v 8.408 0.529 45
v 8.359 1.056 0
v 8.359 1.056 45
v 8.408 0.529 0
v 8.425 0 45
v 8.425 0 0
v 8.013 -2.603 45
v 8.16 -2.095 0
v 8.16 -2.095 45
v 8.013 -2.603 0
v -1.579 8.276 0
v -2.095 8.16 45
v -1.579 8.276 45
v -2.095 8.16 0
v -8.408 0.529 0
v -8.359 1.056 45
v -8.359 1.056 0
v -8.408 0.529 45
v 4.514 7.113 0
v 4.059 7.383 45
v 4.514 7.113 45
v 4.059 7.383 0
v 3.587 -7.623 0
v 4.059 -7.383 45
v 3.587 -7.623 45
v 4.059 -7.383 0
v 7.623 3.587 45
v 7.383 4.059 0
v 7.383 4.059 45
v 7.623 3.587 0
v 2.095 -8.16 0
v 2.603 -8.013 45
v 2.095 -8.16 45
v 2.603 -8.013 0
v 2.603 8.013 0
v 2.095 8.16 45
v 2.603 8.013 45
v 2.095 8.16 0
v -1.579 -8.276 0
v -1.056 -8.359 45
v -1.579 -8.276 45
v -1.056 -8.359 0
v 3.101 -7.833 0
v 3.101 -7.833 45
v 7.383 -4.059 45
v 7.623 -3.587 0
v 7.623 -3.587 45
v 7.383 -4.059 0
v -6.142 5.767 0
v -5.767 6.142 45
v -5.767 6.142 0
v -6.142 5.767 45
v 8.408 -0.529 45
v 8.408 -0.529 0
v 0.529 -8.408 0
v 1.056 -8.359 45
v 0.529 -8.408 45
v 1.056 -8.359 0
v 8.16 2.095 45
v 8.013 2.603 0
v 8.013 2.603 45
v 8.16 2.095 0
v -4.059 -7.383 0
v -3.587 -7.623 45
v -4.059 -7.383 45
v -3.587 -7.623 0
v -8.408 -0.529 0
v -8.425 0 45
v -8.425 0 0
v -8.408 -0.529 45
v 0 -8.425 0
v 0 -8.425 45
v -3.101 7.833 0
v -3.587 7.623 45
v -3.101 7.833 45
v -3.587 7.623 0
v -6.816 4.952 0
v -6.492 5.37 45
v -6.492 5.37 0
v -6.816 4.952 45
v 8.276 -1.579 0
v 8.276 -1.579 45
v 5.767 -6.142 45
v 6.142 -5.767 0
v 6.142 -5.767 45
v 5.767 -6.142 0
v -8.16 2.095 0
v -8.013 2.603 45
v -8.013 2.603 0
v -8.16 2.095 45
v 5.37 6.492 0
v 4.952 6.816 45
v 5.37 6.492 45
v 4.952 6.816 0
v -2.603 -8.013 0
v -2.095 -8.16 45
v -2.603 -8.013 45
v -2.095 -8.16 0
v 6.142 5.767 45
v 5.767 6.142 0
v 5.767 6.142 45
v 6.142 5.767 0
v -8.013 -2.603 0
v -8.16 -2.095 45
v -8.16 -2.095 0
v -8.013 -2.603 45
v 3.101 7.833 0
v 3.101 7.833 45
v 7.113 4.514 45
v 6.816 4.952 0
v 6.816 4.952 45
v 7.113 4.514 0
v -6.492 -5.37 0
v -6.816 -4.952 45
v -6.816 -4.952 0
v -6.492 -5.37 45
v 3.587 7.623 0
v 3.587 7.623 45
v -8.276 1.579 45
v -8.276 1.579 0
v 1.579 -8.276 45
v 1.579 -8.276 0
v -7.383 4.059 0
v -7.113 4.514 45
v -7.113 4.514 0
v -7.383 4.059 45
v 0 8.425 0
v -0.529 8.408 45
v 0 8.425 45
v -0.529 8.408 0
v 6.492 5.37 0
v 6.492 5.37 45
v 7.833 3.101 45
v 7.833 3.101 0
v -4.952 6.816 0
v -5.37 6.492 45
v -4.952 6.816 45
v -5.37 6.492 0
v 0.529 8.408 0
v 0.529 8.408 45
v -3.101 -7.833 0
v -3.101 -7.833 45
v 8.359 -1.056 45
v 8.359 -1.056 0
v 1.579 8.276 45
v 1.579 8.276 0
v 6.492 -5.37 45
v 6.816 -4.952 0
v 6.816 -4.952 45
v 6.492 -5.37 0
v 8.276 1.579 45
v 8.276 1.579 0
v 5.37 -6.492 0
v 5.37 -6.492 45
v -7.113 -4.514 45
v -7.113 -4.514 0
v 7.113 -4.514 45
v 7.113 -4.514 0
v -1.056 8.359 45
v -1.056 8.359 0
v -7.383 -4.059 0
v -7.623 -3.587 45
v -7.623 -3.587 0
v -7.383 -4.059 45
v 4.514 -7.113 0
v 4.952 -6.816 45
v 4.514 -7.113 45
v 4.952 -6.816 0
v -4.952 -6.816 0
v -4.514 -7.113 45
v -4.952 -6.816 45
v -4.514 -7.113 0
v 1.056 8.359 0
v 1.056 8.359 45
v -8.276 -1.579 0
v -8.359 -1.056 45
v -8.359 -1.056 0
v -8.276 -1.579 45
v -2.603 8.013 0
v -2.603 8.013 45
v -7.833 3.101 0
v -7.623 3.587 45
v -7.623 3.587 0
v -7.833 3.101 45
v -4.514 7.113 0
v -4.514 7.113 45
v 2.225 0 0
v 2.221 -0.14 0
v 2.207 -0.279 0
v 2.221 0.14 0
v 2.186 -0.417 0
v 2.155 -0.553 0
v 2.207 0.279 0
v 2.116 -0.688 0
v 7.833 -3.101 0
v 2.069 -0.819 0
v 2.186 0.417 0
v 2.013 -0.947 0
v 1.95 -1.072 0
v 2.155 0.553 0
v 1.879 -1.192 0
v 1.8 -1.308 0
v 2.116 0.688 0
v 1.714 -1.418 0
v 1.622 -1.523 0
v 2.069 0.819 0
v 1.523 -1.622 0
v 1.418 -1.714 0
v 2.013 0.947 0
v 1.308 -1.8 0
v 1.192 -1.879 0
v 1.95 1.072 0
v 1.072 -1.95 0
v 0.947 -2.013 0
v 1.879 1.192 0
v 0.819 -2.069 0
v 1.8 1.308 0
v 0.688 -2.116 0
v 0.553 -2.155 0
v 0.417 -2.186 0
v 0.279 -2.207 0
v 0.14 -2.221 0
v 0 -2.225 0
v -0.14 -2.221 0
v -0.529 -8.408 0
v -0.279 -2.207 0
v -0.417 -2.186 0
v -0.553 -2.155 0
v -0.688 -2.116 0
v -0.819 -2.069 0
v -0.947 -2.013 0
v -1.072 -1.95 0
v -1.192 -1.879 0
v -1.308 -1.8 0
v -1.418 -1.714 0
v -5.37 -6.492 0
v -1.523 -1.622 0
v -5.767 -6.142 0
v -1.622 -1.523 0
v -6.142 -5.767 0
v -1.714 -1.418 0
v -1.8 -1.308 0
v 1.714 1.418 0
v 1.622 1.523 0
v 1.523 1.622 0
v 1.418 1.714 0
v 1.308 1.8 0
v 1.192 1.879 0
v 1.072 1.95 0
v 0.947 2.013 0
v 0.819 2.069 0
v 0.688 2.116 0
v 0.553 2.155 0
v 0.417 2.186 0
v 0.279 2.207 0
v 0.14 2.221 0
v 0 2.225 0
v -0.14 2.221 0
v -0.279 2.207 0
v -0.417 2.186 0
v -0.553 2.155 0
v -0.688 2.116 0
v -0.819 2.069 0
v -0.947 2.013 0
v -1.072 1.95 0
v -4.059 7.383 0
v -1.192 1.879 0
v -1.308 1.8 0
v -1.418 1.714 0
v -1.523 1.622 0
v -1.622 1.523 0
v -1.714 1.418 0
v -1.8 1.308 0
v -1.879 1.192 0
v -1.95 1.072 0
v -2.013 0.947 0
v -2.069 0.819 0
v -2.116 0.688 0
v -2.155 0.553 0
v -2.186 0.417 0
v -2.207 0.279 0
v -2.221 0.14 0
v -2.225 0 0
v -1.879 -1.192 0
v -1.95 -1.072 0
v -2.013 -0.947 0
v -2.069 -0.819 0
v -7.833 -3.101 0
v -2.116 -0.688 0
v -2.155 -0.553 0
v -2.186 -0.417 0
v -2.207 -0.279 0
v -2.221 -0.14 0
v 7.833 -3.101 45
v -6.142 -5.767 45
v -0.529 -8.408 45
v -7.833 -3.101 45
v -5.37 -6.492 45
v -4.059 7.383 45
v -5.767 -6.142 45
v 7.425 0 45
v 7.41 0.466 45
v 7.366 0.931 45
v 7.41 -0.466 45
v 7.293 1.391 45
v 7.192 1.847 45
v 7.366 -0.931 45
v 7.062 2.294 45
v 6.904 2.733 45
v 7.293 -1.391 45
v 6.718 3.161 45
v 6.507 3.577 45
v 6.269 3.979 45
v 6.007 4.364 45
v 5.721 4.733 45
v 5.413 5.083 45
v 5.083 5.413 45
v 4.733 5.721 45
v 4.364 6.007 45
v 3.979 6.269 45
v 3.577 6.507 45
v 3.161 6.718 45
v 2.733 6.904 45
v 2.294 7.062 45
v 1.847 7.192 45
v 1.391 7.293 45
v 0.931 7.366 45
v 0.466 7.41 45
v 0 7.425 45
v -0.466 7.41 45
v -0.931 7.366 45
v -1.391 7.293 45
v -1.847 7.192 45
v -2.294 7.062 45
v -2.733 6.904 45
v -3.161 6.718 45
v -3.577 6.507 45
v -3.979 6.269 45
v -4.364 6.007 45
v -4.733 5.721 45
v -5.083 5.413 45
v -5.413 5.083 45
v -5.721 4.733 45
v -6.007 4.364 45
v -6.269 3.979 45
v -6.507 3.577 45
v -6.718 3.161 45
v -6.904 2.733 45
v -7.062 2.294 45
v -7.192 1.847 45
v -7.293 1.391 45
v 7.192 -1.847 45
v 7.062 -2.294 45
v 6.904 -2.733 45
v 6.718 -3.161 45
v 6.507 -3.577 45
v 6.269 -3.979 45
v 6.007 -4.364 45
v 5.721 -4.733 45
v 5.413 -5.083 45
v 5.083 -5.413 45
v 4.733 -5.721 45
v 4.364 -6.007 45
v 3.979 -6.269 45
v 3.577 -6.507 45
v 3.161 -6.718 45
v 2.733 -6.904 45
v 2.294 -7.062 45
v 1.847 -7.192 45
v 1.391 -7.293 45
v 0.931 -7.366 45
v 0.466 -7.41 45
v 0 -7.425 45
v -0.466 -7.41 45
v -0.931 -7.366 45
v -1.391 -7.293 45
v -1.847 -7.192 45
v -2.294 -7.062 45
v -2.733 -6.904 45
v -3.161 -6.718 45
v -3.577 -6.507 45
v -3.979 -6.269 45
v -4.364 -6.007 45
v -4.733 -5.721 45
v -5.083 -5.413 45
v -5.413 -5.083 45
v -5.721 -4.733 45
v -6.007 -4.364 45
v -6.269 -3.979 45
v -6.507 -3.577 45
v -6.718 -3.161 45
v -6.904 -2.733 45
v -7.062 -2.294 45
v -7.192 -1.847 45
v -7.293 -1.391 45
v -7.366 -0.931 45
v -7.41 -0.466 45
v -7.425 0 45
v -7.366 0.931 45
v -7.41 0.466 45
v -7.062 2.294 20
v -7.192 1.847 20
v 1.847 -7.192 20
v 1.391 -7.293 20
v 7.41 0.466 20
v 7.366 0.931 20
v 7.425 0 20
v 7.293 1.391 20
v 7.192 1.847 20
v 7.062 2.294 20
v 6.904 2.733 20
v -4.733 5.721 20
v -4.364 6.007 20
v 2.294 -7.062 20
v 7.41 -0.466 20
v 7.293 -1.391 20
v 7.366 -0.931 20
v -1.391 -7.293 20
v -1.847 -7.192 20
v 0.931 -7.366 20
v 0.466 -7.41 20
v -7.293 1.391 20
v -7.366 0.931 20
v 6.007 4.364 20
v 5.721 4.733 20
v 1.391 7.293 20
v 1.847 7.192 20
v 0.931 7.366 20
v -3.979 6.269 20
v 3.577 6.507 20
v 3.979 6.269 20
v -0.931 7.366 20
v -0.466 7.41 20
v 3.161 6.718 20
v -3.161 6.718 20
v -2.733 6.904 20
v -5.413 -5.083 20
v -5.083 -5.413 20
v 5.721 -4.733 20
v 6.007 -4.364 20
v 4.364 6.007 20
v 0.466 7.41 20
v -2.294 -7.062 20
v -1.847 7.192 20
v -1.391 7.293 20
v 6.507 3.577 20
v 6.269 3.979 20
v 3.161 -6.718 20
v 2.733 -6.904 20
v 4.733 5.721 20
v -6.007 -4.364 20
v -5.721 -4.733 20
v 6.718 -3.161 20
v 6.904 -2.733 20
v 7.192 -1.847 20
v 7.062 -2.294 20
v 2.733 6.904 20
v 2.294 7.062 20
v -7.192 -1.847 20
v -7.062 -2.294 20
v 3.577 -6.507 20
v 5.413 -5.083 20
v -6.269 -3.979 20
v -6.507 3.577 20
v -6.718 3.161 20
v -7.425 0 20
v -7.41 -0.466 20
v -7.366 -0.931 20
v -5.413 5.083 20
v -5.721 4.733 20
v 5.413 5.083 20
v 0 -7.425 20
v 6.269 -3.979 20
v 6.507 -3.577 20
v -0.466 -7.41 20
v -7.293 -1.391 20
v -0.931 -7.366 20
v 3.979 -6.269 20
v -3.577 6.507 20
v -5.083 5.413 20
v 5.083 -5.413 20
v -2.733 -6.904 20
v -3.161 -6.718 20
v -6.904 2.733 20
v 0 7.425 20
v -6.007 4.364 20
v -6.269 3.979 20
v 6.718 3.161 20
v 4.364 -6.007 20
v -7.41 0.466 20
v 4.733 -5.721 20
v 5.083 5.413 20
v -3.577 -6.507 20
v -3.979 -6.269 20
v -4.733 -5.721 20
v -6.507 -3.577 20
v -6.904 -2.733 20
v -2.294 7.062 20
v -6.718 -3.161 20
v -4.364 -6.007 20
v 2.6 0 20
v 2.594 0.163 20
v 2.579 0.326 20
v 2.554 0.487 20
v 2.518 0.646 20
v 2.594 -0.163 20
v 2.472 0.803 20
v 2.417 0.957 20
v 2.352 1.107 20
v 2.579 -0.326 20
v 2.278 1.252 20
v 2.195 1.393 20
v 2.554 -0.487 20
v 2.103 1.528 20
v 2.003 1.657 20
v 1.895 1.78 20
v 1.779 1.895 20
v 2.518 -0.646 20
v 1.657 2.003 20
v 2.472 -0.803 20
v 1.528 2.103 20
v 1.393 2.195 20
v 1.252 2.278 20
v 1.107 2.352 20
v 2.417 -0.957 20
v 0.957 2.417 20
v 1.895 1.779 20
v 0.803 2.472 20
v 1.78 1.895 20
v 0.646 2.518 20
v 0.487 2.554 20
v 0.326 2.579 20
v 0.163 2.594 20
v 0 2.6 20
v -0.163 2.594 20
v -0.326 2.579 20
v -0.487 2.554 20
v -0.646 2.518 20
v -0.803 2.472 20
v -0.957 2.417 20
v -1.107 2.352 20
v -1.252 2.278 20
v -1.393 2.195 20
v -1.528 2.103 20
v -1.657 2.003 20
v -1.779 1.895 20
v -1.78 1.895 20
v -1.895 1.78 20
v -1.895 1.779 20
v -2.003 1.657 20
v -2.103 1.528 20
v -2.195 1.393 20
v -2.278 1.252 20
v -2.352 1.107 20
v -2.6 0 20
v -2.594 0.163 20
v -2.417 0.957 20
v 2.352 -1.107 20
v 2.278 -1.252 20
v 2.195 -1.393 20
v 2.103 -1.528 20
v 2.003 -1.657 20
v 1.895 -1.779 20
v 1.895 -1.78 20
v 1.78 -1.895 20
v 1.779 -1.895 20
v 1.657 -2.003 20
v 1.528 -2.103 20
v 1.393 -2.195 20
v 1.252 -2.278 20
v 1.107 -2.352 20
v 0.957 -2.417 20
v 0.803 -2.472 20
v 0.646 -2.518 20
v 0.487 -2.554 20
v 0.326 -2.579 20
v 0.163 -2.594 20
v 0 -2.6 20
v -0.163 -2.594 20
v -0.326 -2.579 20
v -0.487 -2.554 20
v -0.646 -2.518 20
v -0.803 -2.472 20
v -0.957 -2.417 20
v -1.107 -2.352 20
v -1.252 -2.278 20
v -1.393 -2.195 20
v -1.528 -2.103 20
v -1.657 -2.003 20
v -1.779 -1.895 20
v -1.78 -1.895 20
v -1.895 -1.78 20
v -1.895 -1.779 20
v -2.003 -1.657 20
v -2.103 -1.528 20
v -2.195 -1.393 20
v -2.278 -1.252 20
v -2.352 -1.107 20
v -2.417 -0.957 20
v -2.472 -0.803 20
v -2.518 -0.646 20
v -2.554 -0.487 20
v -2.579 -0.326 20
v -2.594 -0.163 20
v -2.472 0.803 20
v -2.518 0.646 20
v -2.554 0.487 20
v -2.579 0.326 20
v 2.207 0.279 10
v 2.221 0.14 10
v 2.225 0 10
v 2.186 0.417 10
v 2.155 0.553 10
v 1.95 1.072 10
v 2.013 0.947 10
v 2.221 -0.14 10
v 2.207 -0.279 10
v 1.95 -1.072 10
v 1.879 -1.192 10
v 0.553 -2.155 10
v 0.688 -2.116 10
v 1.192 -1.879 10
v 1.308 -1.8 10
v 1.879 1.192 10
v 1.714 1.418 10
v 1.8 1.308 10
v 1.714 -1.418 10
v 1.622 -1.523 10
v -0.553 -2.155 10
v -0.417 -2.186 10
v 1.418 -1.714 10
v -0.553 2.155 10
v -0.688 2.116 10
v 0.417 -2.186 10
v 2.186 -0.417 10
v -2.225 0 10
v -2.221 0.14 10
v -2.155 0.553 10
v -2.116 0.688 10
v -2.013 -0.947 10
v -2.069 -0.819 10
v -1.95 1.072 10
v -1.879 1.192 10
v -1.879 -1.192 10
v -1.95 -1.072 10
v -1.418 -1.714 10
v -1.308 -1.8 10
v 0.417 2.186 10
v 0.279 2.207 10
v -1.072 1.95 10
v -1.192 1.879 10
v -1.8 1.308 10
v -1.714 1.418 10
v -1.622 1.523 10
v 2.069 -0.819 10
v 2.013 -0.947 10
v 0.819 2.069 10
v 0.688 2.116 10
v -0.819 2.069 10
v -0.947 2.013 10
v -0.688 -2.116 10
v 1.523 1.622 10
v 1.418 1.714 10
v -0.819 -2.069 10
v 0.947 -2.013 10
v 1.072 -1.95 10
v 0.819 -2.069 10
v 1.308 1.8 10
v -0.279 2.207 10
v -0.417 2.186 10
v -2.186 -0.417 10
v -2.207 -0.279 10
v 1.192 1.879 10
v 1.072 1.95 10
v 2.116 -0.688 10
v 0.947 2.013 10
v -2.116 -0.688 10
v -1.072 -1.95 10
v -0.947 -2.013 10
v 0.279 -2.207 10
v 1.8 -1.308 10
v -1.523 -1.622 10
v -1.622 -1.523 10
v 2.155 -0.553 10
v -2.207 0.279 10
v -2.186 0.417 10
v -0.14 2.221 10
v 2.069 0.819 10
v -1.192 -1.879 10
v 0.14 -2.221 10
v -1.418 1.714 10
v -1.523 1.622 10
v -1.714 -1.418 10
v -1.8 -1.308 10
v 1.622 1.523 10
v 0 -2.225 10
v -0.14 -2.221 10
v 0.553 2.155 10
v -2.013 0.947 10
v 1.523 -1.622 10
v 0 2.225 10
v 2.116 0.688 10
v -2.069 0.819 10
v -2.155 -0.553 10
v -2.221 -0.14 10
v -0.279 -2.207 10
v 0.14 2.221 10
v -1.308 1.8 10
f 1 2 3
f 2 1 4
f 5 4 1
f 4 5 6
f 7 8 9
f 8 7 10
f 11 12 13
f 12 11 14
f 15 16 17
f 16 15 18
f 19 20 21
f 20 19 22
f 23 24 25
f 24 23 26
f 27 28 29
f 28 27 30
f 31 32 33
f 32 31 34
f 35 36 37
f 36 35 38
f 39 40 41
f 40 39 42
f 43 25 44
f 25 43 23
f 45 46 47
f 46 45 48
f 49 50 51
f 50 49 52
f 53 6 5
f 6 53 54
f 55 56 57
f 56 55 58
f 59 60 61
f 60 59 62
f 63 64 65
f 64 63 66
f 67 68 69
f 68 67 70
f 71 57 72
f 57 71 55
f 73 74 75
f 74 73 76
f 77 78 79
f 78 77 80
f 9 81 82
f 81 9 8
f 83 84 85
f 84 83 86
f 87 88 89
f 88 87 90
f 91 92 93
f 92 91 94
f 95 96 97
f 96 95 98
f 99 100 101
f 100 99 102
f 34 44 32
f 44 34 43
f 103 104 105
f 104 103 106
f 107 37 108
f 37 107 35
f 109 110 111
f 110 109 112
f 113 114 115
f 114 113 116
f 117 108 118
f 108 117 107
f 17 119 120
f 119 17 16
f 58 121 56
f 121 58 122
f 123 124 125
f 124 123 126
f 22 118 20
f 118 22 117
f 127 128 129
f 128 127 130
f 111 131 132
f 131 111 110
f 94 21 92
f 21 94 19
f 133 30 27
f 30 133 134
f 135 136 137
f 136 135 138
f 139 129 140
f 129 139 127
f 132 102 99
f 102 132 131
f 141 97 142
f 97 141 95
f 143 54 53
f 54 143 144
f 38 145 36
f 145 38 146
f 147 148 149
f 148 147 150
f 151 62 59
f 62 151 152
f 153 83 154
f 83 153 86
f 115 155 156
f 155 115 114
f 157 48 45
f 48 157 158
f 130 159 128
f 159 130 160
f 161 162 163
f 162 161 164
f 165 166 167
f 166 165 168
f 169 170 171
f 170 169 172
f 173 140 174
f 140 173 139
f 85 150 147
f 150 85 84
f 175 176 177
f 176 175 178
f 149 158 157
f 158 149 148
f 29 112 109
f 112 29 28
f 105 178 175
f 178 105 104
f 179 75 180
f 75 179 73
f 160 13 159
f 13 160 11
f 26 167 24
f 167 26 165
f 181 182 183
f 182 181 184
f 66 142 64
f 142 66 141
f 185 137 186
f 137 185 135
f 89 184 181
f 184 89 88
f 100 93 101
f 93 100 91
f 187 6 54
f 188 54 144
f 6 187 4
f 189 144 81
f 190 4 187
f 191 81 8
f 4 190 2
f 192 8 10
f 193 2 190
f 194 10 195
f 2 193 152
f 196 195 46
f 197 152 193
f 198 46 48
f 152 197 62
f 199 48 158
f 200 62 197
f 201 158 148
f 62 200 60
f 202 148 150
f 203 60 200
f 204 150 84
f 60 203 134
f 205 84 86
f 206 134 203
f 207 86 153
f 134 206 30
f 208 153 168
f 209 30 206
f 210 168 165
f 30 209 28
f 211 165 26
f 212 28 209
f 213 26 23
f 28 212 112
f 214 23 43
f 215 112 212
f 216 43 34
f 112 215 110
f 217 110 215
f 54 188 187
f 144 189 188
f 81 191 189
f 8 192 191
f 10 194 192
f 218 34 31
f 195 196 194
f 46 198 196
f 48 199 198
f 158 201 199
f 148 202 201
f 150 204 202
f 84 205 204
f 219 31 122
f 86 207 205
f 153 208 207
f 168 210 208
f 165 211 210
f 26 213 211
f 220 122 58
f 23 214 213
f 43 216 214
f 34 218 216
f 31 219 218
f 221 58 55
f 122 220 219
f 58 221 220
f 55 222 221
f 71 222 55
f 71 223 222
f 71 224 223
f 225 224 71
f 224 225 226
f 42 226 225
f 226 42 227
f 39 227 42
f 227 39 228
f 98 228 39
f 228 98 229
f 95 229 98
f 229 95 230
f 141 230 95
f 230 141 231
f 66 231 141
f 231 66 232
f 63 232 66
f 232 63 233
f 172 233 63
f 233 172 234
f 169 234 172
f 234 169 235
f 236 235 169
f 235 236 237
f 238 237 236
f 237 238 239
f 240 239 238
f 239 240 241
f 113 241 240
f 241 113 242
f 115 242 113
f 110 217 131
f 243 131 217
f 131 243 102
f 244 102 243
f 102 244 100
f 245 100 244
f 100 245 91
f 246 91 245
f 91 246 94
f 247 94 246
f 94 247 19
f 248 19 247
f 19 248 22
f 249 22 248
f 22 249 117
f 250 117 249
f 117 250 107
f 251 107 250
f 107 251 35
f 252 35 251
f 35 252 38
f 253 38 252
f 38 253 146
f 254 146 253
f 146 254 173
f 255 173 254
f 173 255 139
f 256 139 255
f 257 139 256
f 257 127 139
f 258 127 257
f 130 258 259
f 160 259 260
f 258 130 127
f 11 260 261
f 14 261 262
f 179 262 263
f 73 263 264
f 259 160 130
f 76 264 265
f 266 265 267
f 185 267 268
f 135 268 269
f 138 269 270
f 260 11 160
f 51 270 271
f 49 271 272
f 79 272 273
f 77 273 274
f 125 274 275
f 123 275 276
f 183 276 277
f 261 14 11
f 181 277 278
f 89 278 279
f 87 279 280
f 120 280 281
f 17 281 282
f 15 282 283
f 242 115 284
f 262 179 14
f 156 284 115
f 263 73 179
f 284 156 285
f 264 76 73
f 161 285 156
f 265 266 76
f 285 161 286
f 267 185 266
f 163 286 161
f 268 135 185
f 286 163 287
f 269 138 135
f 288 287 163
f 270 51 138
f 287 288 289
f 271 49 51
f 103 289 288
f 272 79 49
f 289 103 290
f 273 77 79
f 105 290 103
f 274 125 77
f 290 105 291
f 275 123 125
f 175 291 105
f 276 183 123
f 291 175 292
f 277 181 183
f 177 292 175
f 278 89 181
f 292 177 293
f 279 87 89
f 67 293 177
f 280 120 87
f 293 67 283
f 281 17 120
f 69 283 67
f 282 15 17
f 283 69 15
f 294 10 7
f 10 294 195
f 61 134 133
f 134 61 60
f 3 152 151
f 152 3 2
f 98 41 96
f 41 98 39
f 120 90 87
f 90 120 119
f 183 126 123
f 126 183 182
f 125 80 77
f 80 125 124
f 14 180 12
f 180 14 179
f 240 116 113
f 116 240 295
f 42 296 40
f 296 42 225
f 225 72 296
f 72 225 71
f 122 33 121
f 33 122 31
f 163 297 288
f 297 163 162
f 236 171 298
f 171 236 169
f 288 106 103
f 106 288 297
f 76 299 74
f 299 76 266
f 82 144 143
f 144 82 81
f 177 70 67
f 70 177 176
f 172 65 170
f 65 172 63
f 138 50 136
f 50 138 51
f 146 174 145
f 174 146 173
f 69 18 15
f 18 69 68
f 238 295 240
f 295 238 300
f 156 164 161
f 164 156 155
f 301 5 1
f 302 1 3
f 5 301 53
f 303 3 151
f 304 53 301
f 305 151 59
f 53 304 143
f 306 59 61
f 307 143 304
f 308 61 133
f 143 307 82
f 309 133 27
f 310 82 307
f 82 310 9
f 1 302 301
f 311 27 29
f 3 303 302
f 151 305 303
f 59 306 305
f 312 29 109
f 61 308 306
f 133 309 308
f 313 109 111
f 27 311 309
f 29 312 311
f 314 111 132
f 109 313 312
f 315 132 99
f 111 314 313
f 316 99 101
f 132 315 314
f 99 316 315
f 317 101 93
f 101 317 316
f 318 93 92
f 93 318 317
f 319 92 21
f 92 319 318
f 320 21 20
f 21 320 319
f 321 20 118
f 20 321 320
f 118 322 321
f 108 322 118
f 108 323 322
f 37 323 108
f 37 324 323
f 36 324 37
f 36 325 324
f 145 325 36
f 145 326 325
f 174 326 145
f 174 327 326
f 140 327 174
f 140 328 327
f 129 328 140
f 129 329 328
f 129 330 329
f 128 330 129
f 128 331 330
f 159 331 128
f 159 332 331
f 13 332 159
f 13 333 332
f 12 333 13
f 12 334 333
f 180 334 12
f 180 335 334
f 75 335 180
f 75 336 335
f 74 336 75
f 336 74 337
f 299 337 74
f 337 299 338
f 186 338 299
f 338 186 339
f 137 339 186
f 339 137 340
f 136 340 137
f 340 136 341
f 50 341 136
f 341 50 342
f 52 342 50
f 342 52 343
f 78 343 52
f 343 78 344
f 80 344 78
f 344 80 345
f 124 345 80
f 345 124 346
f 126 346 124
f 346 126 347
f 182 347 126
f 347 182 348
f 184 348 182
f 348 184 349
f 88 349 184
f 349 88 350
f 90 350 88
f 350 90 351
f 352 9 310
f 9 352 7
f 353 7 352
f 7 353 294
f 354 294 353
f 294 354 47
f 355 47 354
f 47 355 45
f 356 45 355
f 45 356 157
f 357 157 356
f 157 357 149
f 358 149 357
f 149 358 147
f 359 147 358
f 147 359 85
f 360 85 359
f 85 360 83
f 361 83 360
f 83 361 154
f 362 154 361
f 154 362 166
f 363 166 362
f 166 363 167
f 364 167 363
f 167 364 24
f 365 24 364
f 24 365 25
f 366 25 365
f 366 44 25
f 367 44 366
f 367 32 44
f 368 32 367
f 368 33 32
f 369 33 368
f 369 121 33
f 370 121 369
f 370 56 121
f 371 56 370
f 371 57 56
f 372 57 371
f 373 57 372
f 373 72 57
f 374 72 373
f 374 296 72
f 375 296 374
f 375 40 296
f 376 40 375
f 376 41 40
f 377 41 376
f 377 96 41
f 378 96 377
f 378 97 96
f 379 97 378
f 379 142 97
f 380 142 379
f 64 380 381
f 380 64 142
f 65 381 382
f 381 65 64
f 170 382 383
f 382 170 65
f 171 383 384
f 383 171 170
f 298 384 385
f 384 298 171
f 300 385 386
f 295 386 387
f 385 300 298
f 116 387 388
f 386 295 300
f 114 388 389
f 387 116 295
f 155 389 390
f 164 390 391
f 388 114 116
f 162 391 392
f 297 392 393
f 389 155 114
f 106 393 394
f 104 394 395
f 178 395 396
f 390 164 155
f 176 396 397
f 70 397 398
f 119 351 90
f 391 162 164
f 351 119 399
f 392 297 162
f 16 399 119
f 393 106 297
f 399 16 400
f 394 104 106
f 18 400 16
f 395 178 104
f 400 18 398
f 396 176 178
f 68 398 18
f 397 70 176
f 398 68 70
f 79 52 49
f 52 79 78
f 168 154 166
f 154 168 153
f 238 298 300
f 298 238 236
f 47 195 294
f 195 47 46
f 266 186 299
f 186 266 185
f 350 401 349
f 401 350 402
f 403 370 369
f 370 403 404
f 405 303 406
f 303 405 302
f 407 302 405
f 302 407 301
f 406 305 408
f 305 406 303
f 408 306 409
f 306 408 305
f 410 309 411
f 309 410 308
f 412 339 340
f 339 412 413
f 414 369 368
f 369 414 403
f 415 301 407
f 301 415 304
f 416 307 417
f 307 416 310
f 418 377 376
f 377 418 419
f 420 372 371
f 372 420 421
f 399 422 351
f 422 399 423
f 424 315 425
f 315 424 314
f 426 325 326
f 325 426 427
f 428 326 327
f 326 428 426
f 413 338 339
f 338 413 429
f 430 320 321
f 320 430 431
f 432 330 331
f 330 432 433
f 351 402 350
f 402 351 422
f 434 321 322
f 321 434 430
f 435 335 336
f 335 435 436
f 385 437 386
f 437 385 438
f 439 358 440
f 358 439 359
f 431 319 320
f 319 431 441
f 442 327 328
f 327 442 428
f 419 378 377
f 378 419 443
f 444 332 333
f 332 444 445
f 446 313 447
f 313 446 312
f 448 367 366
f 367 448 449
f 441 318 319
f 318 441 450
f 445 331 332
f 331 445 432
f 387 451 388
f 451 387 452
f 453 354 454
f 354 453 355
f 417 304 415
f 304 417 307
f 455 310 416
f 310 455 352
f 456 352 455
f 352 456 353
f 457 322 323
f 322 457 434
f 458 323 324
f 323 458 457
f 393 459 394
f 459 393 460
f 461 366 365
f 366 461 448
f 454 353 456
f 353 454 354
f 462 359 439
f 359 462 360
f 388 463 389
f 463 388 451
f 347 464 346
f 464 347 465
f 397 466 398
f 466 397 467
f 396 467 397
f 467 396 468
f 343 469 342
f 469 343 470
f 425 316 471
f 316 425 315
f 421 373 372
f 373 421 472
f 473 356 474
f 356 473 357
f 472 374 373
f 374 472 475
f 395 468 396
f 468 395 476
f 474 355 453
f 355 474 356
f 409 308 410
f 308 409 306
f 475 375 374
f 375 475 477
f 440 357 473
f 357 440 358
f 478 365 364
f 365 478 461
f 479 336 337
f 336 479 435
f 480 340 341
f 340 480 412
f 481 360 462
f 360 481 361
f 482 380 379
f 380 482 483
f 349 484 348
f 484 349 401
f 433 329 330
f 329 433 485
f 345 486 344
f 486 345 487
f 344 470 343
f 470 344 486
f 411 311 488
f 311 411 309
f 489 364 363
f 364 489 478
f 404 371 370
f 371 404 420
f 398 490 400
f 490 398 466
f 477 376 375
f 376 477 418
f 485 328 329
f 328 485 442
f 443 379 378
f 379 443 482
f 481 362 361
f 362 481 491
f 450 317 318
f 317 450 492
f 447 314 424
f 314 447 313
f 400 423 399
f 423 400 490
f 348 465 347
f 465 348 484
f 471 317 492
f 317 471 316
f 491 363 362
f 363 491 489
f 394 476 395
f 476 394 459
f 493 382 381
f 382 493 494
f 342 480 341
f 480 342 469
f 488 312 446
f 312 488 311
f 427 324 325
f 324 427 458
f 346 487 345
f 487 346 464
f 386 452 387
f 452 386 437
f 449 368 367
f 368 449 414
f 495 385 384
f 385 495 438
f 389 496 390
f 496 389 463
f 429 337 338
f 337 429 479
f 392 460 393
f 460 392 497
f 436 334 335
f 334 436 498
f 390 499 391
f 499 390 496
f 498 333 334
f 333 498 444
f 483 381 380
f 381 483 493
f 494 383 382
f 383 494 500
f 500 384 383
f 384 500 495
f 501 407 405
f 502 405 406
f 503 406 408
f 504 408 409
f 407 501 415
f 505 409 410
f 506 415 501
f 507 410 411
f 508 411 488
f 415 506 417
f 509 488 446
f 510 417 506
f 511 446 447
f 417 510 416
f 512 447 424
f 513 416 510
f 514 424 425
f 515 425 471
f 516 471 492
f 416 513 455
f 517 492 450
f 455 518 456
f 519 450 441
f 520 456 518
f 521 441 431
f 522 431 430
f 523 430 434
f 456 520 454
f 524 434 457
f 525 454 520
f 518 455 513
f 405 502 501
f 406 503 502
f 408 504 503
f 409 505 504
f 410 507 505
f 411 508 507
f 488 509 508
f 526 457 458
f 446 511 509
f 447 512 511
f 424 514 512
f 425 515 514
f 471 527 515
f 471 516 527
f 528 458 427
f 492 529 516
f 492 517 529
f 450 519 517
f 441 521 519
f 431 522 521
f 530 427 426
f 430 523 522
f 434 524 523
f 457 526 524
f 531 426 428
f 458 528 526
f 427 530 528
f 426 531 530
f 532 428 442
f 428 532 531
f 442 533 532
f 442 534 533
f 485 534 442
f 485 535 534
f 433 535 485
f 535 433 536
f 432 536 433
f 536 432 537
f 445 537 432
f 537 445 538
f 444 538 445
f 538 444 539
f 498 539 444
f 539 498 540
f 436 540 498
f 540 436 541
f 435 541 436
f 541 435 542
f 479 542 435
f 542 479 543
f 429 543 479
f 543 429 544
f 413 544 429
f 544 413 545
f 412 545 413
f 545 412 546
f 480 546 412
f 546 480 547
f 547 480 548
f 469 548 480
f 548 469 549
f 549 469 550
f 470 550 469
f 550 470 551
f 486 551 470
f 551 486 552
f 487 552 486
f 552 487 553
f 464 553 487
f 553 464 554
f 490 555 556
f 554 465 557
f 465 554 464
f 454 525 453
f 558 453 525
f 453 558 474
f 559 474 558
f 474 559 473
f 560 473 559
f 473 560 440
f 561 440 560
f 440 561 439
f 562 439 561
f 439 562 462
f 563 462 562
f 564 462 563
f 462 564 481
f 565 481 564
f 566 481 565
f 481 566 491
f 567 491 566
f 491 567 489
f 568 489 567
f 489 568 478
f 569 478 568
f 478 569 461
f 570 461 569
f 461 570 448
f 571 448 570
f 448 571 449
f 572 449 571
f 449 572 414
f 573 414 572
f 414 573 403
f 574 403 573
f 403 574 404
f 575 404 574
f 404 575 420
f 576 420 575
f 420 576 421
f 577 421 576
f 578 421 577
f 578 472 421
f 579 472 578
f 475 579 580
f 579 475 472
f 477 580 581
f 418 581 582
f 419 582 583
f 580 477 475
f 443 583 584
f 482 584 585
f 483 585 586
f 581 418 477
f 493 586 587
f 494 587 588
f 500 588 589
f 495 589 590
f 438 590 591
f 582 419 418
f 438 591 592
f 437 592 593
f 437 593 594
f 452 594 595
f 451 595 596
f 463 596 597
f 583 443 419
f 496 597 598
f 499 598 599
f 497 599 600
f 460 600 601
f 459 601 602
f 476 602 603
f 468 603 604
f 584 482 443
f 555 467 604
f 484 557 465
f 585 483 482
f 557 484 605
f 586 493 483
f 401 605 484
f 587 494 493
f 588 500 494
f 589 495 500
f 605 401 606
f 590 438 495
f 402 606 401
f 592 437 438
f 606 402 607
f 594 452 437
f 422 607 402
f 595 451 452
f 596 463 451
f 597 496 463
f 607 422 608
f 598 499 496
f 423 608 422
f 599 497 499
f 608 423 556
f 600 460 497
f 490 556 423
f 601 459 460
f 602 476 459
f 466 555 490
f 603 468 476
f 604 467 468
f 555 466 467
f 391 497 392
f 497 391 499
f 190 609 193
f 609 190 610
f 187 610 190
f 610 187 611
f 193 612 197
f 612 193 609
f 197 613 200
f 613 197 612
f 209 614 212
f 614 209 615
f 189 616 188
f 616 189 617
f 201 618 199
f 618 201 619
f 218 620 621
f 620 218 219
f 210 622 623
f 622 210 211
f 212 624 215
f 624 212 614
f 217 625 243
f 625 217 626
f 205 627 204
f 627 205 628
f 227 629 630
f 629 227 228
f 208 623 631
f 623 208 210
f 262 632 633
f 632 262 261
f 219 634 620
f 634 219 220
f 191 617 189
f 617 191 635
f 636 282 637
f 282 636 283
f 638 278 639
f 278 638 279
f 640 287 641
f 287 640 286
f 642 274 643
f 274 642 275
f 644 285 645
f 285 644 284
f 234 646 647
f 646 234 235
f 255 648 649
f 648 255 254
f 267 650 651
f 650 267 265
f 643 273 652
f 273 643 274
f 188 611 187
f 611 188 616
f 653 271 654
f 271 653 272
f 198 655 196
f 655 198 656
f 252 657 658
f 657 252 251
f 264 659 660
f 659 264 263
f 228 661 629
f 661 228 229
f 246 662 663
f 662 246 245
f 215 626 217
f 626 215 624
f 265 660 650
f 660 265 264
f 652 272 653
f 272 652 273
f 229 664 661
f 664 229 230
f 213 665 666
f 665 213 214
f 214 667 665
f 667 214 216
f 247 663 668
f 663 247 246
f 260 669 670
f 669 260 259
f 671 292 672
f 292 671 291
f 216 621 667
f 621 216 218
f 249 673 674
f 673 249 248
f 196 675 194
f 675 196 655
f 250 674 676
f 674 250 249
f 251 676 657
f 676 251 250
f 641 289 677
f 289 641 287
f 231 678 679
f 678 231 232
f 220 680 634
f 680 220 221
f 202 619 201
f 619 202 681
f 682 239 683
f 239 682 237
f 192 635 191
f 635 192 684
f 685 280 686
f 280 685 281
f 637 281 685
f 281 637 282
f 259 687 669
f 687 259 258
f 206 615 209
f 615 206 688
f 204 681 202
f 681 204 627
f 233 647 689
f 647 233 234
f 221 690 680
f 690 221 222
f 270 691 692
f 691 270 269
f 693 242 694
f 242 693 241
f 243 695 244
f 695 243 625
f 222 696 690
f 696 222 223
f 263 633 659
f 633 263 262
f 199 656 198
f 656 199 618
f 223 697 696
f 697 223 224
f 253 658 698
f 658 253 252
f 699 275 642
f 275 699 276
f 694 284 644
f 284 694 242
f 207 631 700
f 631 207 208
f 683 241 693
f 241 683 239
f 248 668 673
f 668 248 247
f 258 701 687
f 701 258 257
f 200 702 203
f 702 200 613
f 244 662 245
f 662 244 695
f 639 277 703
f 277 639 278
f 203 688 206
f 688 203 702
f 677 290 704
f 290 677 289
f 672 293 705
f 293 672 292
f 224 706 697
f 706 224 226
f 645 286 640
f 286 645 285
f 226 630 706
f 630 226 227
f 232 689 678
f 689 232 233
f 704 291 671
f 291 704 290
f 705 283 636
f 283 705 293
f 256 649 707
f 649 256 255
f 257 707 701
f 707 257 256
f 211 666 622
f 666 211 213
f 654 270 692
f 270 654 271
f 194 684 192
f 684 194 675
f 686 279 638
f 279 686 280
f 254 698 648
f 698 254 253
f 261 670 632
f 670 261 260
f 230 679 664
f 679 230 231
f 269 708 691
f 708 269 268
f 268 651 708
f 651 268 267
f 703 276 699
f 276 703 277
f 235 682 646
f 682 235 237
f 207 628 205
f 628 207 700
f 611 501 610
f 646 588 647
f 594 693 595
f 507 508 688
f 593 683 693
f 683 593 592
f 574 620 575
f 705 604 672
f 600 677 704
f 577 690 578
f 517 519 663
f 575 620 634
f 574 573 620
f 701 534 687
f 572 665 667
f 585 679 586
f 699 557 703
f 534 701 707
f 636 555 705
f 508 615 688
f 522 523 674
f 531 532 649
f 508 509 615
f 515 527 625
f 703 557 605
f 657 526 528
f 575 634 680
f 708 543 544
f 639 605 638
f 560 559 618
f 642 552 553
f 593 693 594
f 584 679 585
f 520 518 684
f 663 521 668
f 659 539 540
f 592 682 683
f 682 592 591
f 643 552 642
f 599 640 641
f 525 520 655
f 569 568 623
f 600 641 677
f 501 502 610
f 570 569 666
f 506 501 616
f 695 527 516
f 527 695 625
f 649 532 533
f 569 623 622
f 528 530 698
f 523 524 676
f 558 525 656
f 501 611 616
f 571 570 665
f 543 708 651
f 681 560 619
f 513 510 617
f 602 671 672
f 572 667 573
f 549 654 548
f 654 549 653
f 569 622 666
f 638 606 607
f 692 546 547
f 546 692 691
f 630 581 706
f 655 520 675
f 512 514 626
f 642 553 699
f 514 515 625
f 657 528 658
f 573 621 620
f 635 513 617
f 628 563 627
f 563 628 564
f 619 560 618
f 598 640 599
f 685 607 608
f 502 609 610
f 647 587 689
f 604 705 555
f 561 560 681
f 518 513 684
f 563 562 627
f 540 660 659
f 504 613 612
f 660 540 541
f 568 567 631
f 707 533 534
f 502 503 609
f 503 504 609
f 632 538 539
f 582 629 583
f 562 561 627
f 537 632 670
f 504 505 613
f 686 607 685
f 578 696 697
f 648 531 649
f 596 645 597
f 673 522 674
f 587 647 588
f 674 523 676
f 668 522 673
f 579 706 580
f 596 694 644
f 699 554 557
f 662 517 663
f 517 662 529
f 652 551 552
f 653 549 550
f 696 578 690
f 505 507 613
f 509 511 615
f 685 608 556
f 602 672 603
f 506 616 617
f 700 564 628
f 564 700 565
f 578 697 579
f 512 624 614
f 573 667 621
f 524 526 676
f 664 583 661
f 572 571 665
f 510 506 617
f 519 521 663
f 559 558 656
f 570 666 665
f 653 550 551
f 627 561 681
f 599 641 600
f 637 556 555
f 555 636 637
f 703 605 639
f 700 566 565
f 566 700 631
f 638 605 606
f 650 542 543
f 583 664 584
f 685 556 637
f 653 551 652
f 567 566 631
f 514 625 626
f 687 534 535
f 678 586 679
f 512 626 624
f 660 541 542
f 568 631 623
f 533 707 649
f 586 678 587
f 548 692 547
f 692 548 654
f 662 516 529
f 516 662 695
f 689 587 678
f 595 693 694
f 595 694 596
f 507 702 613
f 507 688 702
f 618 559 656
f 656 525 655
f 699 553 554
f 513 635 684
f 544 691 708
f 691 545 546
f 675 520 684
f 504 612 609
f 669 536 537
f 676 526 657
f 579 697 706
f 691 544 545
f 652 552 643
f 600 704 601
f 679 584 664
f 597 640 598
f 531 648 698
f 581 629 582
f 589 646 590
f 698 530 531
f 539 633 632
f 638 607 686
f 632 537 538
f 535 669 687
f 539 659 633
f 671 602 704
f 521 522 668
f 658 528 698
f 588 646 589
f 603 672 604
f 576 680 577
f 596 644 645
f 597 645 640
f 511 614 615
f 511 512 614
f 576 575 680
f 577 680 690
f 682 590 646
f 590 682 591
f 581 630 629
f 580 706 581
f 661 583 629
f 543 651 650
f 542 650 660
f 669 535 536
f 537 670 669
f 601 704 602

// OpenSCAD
$fn = 100;

constriction_d = 0.75;
choke_h = 20.0;

wall_thickness = 1.0;

loose_padding = 0.5;

barrel_tip_h = 25.0;
bore_d = 5.2;
barrel_d = 13.85;

cross_section = false;

total_h = barrel_tip_h + choke_h;

narrow_h = choke_h / 2.0;
taper_h = choke_h / 2.0;

outer_r = (barrel_d / 2.0) + wall_thickness + loose_padding;
slip_over_r = (barrel_d / 2.0) + loose_padding;
narrow_r = (bore_d - constriction_d) / 2.0;

// cross section
difference() {
	// choke
	difference() {
		// main body
		difference() {
			// body blank
			cylinder(total_h, outer_r, outer_r);

			// slip over cutter
			translate([0, 0, choke_h])
				cylinder(barrel_tip_h + 0.5, slip_over_r, slip_over_r);
		}

		// bore cutter
		union() {
			// narrow cutter
			translate([0, 0, -0.01])
				cylinder(narrow_h + 0.02, narrow_r, narrow_r);
			
			// taper cutter
			translate([0, 0, narrow_h])
				cylinder(taper_h + 0.01, narrow_r, bore_d / 2.0);
		}
	}

	if (cross_section) {
 		translate([-outer_r, 0, -0.5])
 			cube([2 * outer_r, outer_r, total_h + 1.0]);
	}
};
